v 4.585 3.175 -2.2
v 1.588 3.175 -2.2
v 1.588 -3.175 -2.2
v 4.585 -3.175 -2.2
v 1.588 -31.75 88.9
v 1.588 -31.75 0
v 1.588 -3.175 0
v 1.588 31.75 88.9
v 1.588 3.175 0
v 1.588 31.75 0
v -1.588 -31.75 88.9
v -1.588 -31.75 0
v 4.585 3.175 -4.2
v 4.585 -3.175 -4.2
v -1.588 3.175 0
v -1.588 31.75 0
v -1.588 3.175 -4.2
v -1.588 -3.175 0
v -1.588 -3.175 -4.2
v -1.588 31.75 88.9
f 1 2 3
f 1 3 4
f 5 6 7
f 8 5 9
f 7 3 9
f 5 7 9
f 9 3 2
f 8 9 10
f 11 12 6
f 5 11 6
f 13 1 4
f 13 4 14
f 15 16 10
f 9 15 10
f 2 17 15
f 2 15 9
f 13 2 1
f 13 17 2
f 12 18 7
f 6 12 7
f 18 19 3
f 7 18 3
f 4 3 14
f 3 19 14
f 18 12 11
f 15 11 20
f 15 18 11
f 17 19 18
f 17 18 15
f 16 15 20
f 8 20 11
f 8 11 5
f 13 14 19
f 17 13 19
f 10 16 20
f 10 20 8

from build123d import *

# Parameters (mm, degrees)
SKETCH1_W           = 3.175
SKETCH1_H           = 63.5
BOSS_EXTRUDE1_DEPTH = 88.9
BOSS_EXTRUDE2_DEPTH = 3.175


with BuildPart() as part:
    # Sketch1 → Boss-Extrude1 (new body)
    with BuildSketch(Plane.XY):
        Rectangle(SKETCH1_W, SKETCH1_H)
    extrude(amount=BOSS_EXTRUDE1_DEPTH)

    # Sketch2 → Boss-Extrude2 (add, symmetric)
    with BuildSketch(Plane(origin=(0, 0, 0), x_dir=(1, 0, 0), z_dir=(0, 1, 0))):
        Polygon((1.5875, 0), (1.5875, 2.2), (4.5847, 2.2), (4.5847, 4.2), (-1.5875, 4.2), (-1.5875, 0), align=None)
    extrude(amount=BOSS_EXTRUDE2_DEPTH, both=True)


solid = part.part
